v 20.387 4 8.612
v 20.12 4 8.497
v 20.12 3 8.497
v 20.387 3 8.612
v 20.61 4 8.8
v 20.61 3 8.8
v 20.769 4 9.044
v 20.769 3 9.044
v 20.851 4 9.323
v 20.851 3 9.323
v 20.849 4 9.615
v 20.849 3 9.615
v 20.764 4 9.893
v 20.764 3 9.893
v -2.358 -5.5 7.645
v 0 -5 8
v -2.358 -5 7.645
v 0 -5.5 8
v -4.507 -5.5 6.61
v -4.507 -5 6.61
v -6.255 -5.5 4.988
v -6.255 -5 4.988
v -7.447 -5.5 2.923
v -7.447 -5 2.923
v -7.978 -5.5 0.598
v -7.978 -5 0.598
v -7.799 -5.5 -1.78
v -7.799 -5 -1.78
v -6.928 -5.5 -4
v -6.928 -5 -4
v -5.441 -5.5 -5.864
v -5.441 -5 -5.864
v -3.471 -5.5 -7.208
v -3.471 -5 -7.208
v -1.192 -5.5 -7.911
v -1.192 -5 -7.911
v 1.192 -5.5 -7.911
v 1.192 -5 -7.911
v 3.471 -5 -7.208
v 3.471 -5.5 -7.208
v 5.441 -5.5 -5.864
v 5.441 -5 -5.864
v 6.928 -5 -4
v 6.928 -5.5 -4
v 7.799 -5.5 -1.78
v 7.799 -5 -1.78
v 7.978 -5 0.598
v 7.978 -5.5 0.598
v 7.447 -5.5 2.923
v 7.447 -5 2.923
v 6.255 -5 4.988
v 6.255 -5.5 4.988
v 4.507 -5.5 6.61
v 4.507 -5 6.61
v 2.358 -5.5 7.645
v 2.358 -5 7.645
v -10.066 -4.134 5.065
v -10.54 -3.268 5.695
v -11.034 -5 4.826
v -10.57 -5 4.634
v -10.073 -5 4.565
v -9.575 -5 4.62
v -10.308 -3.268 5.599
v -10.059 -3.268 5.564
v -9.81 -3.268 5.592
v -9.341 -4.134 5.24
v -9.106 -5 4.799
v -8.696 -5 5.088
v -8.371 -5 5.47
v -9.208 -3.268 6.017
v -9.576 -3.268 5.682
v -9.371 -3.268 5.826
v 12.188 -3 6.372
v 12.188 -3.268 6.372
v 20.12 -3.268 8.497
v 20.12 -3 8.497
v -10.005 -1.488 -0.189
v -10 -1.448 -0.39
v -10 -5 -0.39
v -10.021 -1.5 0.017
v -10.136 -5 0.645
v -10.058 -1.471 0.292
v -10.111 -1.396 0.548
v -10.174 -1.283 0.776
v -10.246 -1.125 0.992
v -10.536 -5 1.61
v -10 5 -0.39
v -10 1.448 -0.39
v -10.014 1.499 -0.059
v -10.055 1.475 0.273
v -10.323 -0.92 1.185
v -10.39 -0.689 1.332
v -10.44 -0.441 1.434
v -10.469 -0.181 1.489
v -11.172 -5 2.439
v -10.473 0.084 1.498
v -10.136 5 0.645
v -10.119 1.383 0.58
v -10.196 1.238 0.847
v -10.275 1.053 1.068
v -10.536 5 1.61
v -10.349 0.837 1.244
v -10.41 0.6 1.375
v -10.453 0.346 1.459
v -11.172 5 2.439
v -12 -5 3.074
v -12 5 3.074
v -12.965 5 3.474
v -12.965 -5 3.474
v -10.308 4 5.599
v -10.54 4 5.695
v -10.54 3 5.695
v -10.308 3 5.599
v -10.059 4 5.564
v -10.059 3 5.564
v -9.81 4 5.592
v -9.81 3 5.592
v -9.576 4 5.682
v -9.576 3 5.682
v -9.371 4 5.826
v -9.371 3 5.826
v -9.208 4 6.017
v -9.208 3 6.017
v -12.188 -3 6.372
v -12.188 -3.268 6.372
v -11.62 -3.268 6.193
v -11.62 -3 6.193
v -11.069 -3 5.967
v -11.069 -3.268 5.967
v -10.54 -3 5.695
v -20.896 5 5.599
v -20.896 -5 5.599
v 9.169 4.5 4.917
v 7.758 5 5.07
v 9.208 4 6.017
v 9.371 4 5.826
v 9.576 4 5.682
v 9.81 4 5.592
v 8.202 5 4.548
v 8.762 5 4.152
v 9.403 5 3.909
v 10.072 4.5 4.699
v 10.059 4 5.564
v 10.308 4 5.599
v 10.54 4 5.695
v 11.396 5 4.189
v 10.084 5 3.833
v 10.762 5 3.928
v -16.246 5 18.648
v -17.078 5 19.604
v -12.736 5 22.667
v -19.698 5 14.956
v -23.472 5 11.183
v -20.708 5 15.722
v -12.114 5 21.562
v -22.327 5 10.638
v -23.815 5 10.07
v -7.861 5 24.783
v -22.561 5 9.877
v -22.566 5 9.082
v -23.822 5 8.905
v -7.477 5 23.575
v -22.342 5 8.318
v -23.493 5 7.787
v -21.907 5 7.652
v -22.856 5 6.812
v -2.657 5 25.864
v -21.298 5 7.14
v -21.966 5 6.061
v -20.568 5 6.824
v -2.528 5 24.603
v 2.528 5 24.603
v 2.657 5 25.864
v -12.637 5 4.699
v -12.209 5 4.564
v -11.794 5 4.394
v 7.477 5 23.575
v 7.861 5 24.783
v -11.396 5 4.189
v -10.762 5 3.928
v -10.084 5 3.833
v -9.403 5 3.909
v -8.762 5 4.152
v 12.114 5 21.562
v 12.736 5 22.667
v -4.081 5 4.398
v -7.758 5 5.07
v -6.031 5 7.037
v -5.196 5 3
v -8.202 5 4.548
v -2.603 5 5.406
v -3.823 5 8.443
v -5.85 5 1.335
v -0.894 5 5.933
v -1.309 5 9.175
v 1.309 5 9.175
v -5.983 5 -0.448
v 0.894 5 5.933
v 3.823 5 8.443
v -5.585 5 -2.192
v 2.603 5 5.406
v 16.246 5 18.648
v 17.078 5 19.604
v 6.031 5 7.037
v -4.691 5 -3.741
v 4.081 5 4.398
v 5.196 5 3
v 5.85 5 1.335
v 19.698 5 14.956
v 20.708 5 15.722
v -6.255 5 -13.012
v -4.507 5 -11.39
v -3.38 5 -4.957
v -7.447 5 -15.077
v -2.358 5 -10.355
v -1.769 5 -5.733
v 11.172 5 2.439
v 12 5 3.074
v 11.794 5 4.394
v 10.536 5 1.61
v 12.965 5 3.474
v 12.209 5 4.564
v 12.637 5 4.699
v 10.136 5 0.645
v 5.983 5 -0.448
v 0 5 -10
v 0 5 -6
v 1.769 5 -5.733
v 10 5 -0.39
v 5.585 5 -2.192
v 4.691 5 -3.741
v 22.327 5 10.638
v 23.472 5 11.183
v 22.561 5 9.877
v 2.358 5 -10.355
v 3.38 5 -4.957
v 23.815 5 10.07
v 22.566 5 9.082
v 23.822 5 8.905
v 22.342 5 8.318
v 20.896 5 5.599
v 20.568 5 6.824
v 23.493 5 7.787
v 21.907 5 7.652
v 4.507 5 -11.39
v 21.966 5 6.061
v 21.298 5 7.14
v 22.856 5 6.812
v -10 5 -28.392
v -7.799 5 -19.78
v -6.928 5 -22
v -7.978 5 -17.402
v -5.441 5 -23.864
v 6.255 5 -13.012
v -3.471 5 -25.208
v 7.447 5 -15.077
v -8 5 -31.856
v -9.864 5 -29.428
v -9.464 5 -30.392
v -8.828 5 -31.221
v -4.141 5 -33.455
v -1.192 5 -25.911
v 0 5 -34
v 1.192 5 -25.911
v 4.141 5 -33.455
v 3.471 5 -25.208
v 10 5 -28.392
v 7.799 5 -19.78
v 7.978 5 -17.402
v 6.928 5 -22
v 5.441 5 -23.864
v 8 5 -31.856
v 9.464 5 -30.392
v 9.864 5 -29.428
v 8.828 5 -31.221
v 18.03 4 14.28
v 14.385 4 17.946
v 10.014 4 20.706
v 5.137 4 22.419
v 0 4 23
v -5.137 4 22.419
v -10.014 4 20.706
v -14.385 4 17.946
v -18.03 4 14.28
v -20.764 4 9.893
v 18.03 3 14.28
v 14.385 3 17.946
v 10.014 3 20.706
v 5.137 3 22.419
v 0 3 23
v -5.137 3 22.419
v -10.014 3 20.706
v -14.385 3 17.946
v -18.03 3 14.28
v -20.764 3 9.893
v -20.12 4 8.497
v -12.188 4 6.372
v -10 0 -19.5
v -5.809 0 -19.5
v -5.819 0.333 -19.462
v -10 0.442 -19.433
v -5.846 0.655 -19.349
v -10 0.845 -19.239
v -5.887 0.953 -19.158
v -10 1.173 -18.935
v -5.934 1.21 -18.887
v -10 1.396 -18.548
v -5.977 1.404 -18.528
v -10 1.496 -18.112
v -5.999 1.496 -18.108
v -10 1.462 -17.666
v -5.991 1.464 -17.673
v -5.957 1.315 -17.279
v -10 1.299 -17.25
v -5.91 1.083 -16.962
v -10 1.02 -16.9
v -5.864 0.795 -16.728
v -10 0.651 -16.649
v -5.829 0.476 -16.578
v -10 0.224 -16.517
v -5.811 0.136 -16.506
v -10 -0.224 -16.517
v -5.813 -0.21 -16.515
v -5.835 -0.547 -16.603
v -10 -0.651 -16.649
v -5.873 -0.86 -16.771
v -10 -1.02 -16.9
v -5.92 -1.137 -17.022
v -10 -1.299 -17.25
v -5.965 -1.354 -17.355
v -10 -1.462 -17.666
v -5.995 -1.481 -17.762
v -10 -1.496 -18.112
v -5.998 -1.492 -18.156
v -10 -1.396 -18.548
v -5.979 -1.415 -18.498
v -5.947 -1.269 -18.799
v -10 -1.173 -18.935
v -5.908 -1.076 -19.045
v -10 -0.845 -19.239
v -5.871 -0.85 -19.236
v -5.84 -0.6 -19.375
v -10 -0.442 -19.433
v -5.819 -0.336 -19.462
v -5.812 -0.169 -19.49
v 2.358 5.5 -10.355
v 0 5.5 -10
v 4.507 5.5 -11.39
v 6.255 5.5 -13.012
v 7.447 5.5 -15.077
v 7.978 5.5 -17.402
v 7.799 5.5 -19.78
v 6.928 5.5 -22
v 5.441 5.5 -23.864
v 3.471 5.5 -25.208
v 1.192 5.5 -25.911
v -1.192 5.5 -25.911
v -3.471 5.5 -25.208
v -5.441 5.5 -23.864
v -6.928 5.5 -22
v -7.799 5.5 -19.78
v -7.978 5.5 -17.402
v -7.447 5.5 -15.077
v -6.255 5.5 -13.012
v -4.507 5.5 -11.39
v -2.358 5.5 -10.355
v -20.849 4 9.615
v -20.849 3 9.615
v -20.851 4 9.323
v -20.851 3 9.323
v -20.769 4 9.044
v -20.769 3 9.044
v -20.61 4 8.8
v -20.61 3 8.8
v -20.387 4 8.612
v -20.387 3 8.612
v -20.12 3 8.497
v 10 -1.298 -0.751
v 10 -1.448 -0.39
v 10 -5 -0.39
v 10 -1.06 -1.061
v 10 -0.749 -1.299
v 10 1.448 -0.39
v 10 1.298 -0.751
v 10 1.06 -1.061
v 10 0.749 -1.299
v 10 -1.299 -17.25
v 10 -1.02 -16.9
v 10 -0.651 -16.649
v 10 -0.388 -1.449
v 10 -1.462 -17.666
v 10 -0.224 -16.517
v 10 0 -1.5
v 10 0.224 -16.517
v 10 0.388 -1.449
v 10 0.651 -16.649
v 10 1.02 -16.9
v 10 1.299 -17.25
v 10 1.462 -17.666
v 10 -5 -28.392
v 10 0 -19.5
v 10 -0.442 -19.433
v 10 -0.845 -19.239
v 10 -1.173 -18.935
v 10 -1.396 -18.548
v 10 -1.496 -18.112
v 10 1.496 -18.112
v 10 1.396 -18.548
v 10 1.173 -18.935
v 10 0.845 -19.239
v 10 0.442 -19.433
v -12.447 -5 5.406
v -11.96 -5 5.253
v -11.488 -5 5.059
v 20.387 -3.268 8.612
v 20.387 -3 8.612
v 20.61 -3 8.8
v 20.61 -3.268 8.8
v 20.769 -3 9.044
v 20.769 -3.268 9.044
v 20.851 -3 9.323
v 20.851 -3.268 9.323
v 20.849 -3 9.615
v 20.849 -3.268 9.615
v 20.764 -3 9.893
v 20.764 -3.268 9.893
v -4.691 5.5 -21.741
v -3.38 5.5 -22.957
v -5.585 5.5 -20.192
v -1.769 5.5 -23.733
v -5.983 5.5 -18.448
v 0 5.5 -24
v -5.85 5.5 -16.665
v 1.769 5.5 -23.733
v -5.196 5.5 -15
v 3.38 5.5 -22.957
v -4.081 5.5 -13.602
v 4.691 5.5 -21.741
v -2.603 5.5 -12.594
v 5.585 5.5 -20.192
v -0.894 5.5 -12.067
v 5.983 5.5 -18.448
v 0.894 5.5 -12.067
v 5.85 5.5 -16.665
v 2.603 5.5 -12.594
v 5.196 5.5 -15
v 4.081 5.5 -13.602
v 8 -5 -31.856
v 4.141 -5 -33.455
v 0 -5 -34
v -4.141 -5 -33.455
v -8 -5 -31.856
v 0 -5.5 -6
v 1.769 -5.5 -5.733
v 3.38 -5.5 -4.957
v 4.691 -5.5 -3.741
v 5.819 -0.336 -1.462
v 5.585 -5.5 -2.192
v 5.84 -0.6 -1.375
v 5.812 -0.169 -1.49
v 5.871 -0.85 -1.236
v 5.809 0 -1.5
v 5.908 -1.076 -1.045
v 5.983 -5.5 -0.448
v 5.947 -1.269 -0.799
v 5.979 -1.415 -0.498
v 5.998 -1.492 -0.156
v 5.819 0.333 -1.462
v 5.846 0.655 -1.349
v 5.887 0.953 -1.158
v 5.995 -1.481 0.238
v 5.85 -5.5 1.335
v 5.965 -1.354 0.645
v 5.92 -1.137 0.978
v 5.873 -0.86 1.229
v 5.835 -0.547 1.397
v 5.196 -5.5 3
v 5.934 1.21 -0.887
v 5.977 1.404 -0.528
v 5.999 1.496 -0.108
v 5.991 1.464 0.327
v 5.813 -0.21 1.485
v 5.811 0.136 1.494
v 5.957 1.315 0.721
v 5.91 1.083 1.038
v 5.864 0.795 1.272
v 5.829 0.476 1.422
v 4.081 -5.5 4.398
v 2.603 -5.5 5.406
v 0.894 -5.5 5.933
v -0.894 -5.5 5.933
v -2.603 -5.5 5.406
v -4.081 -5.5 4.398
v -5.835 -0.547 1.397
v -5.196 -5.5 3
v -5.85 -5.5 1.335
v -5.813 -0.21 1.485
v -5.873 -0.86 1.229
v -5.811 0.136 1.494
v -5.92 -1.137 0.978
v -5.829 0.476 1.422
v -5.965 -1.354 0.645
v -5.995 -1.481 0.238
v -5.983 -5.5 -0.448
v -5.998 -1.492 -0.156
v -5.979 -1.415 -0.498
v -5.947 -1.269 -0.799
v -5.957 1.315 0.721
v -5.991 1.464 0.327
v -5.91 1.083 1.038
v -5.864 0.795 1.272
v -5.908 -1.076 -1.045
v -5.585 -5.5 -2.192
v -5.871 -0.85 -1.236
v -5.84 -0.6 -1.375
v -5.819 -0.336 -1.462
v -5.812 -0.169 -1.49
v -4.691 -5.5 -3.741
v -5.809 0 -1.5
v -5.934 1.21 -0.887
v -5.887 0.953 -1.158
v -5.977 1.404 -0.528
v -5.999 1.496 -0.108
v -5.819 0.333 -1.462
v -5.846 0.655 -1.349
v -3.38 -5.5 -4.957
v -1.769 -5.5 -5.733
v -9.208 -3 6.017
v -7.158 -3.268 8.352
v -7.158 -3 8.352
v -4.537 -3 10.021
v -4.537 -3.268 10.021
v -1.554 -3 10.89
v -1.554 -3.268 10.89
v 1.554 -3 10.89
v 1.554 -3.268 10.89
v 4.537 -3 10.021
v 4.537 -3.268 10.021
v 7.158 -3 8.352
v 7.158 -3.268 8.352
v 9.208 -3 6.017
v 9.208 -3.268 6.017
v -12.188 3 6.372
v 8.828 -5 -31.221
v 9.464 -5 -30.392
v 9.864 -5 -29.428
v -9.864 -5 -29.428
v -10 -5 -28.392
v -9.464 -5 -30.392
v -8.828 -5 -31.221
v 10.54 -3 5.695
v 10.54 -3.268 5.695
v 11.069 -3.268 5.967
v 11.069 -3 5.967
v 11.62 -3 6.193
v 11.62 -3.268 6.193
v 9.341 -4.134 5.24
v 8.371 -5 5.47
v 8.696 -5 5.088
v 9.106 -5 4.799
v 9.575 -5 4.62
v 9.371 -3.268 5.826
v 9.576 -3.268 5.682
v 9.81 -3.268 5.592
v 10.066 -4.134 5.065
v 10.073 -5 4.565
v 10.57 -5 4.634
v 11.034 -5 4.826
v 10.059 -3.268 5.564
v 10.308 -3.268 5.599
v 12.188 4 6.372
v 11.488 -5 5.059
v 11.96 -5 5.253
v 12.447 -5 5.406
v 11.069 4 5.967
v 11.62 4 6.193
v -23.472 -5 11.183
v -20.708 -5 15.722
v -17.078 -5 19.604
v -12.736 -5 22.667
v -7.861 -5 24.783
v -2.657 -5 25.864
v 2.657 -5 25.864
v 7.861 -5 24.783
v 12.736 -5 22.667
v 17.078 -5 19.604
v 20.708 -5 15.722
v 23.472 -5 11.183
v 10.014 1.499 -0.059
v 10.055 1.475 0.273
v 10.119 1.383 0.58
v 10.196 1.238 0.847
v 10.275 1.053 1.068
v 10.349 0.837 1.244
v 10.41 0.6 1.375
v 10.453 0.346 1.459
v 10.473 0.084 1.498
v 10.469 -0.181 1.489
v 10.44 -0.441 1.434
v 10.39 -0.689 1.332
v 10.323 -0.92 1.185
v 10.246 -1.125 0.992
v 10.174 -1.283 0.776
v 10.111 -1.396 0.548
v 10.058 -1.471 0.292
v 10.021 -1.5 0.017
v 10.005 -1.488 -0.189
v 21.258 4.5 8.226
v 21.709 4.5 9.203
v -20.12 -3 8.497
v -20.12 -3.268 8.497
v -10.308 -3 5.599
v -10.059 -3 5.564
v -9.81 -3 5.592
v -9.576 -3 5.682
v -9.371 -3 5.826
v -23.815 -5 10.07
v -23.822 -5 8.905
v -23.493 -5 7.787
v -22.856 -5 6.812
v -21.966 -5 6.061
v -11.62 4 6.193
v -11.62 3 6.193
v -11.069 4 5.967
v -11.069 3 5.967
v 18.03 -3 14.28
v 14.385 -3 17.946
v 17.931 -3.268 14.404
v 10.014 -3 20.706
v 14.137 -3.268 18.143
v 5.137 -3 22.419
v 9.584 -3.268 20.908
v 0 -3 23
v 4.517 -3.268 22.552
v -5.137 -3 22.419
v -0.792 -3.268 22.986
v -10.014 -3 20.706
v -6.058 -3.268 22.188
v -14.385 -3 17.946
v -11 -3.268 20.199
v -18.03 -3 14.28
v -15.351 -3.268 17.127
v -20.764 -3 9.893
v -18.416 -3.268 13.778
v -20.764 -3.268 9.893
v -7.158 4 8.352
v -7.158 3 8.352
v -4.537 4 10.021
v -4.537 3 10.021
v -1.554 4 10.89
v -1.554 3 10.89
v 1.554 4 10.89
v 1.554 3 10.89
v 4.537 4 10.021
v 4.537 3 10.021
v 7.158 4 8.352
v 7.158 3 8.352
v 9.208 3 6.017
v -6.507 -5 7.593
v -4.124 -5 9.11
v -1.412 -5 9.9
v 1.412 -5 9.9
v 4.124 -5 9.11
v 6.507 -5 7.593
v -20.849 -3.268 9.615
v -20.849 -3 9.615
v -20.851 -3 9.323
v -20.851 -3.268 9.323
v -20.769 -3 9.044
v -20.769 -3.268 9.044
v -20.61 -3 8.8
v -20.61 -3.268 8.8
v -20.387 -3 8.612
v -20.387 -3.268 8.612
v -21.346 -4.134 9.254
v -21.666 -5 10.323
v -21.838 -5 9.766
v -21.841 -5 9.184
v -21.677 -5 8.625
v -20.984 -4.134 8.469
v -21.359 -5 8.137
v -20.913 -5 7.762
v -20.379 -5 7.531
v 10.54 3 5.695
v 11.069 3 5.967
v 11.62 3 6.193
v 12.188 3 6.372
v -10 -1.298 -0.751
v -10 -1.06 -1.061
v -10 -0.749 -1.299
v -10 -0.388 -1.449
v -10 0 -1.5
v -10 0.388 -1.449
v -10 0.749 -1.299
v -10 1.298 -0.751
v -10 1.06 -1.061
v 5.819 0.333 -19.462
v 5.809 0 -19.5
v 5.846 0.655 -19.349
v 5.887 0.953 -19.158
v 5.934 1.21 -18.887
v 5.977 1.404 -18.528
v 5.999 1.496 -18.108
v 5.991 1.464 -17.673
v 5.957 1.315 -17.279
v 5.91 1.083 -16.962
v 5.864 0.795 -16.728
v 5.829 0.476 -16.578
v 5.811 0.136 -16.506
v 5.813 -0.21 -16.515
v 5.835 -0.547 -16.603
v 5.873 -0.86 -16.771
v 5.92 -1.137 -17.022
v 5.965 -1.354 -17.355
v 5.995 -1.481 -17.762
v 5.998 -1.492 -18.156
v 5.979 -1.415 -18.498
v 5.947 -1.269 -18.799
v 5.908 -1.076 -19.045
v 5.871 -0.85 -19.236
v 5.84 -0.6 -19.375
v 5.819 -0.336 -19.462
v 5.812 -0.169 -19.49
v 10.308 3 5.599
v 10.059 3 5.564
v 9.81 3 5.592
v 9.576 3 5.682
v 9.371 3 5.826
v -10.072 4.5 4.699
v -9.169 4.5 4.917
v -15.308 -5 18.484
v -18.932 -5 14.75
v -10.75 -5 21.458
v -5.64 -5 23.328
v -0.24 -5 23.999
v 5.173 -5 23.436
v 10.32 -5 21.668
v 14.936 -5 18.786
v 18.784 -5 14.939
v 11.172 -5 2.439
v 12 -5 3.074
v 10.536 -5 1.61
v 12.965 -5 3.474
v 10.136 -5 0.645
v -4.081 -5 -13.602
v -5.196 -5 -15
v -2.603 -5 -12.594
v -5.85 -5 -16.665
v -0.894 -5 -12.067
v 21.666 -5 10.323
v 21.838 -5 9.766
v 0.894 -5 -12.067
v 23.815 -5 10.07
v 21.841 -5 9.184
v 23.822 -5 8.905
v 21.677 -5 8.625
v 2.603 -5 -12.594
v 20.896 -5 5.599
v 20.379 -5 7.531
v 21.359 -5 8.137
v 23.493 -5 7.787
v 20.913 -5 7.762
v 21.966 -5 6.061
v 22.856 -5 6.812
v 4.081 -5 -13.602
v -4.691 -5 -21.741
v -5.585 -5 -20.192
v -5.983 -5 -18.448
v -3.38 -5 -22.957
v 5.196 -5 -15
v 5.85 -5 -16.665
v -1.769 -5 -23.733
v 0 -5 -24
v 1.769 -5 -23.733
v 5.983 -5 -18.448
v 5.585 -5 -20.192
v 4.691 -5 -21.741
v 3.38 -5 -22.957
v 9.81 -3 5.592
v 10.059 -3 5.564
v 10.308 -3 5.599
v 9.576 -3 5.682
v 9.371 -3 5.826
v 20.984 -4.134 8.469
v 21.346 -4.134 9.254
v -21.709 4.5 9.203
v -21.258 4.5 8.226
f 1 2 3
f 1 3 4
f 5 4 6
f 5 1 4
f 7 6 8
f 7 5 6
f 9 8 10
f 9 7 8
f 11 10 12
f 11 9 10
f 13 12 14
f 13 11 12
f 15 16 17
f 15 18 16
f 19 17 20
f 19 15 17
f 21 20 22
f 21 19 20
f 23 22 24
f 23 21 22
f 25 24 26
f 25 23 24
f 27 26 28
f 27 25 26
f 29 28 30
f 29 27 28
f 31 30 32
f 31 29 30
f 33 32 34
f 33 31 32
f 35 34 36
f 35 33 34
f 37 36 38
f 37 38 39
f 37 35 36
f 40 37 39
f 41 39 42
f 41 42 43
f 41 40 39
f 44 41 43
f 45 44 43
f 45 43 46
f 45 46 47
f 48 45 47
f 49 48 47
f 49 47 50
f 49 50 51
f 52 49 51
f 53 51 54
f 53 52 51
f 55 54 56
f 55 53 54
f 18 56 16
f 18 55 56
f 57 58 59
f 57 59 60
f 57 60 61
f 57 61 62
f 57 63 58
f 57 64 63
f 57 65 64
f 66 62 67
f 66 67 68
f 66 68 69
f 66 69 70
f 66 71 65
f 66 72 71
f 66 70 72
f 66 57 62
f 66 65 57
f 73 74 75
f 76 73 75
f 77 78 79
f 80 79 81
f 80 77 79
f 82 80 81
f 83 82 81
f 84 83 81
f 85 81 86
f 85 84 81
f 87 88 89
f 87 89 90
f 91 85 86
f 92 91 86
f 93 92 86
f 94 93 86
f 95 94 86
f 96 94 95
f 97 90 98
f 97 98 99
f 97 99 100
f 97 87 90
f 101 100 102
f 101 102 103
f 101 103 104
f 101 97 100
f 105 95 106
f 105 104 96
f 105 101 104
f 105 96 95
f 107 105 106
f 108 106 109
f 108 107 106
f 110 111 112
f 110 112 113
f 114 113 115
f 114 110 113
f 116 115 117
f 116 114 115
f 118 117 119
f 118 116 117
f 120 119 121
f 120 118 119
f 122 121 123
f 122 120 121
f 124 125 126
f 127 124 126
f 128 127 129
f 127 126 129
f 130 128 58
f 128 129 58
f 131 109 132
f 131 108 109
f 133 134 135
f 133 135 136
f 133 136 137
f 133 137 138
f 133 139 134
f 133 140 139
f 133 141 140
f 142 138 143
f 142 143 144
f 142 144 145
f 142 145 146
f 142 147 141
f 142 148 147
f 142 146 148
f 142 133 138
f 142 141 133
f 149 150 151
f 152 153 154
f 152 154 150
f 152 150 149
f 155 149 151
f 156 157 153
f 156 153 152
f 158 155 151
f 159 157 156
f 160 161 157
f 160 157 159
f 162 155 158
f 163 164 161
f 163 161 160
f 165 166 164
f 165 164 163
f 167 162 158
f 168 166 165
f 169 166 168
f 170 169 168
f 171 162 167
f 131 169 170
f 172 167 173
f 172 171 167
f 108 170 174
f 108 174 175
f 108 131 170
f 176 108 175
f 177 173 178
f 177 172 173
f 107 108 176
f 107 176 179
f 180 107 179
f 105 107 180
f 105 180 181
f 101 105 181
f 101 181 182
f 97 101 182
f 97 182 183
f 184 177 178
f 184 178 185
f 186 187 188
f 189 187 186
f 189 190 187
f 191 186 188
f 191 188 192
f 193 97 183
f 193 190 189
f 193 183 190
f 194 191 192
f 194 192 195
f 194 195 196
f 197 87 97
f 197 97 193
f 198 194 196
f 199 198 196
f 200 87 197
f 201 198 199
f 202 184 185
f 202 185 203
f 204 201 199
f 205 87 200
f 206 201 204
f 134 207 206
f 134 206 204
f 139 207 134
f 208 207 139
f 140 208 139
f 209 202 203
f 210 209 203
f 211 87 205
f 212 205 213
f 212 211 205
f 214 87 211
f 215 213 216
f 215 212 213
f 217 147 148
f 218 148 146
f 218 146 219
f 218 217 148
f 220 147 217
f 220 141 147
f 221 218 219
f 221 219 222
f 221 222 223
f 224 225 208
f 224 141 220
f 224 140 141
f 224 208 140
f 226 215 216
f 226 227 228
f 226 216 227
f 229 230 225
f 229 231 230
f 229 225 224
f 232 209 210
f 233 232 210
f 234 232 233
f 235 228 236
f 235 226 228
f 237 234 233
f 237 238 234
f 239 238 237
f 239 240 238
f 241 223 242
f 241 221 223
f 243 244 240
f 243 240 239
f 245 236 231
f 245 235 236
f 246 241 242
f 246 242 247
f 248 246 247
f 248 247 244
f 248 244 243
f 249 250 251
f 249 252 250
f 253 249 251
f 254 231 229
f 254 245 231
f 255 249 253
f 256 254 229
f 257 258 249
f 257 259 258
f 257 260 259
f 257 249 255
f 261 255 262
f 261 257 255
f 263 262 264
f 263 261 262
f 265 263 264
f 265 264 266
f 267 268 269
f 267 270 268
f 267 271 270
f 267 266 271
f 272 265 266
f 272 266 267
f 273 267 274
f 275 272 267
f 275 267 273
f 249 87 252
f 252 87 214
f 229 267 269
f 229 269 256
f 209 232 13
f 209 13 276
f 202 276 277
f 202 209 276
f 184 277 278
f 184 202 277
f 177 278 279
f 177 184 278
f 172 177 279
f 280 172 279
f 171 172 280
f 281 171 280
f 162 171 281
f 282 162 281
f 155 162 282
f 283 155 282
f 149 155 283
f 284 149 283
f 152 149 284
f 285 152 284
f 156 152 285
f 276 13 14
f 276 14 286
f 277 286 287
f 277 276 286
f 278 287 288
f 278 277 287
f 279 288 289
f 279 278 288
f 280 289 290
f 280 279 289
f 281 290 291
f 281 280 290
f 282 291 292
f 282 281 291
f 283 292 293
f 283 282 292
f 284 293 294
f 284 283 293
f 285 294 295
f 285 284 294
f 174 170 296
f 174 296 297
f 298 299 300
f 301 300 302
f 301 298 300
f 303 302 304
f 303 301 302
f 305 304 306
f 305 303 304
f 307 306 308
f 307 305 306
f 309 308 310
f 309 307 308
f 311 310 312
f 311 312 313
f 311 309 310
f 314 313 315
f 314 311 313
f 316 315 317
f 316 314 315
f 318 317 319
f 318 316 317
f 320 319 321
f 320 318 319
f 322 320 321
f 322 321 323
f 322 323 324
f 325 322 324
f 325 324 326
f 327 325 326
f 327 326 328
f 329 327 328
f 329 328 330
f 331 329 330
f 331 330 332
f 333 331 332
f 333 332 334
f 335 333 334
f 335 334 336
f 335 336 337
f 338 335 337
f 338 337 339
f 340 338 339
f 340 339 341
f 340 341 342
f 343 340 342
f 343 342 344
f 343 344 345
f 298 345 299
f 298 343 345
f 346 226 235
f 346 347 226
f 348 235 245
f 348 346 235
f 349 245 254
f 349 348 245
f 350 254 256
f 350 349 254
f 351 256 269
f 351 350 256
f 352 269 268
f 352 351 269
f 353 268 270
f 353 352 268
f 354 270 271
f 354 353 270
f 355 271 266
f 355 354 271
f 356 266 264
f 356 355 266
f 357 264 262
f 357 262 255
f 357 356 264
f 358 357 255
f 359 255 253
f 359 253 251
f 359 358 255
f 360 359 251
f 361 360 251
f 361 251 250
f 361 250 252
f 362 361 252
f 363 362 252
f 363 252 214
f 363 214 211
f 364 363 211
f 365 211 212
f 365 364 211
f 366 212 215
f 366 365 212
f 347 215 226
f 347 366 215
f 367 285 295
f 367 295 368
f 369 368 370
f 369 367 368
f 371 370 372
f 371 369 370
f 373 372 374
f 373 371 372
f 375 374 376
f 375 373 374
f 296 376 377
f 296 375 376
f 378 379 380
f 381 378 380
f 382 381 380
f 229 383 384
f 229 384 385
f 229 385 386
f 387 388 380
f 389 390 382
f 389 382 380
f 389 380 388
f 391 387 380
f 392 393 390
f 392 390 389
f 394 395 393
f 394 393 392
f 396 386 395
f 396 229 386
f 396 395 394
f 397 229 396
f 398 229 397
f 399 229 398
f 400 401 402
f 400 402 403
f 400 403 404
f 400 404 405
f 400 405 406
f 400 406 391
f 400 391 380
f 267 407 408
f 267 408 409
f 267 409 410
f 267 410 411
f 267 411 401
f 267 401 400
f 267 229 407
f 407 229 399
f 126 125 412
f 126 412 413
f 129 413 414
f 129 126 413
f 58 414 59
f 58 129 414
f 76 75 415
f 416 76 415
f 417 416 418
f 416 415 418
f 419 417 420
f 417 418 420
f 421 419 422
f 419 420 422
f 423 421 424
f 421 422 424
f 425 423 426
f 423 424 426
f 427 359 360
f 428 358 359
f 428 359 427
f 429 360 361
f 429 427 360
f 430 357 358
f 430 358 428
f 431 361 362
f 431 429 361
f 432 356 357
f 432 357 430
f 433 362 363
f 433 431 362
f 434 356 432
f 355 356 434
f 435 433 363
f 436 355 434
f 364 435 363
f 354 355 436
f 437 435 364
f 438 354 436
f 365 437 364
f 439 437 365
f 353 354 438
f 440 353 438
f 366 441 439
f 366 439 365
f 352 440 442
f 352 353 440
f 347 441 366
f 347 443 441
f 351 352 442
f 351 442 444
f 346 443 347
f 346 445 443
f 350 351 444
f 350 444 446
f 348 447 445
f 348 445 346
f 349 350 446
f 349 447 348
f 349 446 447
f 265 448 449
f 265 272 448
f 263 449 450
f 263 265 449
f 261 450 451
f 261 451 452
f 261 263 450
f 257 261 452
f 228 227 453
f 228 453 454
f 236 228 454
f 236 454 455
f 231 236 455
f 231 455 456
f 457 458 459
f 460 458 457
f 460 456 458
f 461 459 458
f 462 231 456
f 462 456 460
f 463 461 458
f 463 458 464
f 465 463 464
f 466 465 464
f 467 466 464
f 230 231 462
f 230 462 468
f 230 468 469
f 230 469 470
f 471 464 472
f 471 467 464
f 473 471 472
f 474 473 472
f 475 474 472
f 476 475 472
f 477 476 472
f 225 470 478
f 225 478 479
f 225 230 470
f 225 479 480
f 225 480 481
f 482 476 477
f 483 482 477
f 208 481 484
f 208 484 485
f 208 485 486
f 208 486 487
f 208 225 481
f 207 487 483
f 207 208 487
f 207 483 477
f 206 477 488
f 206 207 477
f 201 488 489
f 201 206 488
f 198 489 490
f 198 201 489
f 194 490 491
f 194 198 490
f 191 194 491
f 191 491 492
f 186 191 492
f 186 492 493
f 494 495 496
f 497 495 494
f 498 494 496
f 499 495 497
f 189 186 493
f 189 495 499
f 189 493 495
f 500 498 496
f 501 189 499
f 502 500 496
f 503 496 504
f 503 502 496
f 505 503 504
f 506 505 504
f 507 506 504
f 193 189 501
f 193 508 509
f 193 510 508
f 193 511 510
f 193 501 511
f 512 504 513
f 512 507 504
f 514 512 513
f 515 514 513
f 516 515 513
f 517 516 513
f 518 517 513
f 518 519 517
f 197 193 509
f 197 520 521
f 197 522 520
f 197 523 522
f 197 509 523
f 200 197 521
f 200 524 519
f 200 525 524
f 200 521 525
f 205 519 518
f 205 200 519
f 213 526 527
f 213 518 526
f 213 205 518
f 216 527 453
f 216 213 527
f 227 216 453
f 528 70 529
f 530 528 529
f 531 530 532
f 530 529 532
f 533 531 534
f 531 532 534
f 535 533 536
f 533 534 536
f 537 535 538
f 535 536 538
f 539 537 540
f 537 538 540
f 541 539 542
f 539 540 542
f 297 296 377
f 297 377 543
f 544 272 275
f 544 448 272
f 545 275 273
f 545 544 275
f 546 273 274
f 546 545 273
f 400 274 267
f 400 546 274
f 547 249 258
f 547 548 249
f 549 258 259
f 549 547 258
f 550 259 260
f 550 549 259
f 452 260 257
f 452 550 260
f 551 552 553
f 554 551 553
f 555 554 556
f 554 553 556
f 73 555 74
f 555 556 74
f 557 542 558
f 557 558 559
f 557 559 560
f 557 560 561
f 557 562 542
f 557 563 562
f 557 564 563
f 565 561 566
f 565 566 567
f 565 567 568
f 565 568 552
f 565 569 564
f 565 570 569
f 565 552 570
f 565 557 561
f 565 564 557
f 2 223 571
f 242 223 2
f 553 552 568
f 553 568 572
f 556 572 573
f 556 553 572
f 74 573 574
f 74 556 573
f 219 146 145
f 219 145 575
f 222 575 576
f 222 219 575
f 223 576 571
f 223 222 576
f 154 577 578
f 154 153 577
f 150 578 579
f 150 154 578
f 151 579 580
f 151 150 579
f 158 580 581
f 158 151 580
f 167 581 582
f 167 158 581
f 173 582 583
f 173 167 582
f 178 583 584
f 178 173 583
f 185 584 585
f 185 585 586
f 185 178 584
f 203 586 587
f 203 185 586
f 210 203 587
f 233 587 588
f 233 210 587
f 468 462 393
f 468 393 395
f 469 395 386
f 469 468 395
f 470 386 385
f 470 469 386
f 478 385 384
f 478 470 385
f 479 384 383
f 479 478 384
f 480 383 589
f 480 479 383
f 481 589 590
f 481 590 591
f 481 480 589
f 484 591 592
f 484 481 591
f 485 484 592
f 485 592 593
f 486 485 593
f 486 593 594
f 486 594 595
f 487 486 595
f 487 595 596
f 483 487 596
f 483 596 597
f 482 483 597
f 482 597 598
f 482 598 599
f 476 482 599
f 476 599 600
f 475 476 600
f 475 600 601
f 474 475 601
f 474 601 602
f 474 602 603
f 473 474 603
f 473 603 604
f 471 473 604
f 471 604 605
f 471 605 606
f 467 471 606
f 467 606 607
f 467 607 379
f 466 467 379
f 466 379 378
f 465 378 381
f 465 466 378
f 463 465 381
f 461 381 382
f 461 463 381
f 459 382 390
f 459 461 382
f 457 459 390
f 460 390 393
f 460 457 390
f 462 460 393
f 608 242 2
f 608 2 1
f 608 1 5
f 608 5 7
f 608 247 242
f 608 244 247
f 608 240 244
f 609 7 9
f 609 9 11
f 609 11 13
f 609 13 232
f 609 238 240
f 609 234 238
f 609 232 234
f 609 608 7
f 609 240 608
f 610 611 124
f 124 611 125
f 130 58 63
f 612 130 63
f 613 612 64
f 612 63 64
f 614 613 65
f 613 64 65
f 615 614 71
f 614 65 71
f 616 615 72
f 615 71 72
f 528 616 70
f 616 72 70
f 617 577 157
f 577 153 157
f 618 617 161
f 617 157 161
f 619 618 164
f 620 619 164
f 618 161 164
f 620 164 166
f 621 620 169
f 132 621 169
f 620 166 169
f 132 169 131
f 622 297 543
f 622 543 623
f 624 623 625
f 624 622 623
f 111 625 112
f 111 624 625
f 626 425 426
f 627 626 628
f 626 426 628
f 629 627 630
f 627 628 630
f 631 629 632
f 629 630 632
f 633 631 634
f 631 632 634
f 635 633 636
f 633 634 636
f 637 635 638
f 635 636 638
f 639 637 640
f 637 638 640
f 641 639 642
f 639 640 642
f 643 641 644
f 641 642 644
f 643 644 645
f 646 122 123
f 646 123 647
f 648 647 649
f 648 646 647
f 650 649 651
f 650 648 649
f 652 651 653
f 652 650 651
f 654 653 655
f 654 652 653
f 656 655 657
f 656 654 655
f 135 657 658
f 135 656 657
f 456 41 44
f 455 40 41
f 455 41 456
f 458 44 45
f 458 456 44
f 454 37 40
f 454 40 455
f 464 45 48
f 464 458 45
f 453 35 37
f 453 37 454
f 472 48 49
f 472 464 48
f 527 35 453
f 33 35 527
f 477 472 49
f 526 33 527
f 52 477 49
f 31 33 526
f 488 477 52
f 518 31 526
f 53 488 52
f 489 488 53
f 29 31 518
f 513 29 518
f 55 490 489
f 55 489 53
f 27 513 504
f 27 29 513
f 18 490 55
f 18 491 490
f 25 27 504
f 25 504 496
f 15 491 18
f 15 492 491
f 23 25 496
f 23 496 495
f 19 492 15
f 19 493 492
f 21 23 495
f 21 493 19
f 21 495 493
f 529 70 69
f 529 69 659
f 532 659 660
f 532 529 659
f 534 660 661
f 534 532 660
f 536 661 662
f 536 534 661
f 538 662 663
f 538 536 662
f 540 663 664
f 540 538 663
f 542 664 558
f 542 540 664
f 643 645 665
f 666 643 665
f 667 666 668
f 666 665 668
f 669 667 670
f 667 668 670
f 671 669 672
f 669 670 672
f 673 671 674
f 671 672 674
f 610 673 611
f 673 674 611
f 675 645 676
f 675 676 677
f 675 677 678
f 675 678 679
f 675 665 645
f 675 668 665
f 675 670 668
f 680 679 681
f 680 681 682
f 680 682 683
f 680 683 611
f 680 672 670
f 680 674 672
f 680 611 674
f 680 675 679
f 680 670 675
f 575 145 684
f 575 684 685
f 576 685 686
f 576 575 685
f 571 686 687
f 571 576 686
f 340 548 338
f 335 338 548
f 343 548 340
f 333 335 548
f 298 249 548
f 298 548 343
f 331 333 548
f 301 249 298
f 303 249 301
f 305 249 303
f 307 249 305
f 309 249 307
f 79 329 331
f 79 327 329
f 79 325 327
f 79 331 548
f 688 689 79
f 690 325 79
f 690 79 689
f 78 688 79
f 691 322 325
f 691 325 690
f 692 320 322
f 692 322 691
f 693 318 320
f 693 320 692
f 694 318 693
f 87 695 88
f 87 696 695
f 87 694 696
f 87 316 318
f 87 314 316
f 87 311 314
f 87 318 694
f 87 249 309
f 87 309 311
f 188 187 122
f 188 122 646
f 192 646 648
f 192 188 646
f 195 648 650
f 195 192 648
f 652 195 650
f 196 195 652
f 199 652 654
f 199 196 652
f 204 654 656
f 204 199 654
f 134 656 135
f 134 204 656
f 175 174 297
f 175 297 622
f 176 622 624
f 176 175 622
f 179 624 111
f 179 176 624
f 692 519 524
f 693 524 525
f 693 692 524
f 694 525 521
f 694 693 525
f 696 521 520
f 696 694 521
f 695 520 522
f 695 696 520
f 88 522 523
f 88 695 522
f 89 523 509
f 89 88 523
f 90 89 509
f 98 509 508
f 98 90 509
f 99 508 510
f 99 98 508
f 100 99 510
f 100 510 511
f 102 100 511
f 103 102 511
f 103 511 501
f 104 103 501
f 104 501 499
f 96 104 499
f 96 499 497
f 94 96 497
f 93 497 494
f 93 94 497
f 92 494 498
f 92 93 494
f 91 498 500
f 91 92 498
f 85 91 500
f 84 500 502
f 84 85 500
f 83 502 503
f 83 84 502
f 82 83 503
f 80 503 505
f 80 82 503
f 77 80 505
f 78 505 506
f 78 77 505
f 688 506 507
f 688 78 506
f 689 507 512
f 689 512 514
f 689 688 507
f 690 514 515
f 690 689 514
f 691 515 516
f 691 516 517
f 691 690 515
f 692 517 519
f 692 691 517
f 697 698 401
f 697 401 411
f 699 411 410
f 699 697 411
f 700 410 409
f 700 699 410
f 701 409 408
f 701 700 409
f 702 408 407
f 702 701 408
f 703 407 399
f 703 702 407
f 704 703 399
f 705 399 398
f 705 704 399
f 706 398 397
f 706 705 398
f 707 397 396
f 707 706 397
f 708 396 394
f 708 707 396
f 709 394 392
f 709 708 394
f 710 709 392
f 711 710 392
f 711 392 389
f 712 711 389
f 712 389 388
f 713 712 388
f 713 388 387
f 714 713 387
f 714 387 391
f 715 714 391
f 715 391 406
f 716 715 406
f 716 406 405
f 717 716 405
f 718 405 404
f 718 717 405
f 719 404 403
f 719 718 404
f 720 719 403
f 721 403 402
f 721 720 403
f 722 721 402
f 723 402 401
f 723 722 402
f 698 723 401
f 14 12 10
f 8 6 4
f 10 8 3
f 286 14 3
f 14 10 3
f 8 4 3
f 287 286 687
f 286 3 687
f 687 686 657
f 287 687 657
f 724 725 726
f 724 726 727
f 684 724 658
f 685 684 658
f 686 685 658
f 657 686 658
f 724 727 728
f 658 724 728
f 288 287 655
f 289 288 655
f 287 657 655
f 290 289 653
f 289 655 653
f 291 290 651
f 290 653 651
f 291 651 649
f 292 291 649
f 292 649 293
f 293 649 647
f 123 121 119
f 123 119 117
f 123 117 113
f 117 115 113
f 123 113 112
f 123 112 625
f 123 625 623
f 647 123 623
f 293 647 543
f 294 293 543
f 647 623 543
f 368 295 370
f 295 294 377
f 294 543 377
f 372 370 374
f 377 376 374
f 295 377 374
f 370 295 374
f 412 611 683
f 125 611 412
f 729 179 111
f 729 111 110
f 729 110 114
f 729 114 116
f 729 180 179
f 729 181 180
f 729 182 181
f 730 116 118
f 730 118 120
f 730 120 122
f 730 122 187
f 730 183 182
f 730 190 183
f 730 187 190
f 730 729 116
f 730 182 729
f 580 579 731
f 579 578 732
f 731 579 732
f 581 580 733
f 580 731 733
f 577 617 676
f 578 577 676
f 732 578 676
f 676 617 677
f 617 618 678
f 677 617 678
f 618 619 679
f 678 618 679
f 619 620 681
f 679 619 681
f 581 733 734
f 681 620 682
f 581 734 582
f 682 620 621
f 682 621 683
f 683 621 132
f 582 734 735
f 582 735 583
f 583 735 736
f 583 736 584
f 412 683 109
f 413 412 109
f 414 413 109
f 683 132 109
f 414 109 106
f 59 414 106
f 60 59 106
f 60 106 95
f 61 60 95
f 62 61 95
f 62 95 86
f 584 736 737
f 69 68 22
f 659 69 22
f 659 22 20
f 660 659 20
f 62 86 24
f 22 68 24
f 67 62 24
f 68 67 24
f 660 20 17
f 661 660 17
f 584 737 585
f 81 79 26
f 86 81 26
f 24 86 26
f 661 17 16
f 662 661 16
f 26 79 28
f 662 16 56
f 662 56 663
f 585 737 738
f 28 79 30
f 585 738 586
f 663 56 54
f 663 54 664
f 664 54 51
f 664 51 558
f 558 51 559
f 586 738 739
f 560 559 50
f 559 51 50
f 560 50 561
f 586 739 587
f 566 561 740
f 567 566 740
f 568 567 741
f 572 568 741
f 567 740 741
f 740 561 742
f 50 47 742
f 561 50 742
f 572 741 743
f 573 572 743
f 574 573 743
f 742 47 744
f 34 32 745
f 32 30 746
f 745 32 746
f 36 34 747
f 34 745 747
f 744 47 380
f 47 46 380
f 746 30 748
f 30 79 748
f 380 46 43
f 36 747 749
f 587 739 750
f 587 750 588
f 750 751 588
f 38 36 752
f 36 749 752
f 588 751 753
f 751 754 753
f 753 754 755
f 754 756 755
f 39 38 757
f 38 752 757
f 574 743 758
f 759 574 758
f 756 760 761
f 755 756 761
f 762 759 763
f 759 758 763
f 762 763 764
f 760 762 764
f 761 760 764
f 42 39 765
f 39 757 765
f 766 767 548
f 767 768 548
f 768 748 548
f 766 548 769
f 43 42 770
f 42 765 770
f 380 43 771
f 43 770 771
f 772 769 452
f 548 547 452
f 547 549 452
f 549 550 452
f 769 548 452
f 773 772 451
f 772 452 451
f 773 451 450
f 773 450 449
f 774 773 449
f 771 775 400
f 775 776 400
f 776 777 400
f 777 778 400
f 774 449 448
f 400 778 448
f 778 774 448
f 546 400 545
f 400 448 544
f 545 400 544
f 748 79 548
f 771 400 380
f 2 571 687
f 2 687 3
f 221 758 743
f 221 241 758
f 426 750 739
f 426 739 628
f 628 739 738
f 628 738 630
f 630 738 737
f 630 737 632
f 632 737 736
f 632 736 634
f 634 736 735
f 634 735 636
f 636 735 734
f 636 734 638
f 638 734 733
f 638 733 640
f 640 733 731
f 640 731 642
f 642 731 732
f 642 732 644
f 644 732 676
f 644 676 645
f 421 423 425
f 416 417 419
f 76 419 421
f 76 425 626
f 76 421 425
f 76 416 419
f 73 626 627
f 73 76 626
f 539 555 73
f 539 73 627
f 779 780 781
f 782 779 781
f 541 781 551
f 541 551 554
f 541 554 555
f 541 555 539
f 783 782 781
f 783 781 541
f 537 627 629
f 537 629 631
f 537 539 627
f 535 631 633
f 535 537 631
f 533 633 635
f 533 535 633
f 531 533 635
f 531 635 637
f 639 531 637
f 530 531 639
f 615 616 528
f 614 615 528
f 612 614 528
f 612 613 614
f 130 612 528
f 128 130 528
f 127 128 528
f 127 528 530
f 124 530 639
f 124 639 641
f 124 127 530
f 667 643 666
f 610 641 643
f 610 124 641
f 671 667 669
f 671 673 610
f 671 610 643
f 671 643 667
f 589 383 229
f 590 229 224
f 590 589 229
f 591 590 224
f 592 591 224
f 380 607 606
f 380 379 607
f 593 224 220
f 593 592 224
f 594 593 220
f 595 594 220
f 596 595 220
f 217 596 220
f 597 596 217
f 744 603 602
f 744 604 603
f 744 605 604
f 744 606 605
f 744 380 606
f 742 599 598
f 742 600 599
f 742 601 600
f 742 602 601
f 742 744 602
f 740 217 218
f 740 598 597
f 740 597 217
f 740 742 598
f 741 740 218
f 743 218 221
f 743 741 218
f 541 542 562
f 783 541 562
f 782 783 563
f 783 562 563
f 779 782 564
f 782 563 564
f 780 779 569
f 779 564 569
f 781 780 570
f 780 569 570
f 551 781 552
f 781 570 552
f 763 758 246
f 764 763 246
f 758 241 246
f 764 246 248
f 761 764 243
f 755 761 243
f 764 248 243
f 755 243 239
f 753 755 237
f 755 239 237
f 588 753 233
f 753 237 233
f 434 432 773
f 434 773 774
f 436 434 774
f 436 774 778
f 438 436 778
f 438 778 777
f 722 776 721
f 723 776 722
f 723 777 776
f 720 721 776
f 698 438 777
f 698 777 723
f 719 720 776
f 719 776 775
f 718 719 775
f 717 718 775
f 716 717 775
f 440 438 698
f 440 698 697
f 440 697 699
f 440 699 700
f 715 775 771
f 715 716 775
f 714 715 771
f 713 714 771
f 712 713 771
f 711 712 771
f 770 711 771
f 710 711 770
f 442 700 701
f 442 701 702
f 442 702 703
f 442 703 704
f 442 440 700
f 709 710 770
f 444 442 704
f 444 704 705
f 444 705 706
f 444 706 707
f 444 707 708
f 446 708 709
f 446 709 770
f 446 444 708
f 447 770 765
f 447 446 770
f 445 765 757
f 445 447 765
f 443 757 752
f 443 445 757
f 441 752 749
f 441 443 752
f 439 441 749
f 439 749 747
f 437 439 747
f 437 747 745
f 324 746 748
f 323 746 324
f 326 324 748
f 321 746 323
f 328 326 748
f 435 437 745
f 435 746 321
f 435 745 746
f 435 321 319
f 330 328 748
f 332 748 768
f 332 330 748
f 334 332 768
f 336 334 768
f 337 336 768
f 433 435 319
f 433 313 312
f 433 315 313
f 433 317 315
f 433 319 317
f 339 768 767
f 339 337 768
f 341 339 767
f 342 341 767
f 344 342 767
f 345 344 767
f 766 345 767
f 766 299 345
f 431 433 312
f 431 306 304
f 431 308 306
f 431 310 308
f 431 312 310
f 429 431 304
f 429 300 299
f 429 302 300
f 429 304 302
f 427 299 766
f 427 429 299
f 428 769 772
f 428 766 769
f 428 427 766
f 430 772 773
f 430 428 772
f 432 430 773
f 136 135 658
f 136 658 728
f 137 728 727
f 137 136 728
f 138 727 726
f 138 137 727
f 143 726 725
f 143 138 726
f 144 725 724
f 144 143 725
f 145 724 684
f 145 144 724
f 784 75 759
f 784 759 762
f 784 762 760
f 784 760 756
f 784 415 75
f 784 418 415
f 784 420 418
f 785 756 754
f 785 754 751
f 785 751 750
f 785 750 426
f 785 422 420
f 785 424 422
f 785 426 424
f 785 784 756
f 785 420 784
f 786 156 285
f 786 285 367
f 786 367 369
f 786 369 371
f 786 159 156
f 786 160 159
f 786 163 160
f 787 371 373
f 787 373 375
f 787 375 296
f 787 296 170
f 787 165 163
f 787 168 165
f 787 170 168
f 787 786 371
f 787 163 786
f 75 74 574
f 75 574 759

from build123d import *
from OCP.BRepFilletAPI import BRepFilletAPI_MakeChamfer

# Parameters (mm, degrees)
BOSS_EXTRUDE1_DEPTH     = 5
FILLET1_R               = 4
SKETCH2_R               = 8
BOSS_EXTRUDE2_DEPTH     = 0.5
SKETCH3_R               = 8
BOSS_EXTRUDE3_DEPTH     = 0.5
SKETCH4_R               = 8
BOSS_EXTRUDE4_DEPTH     = 0.5
CUT_EXTRUDE1_DEPTH      = 43.969085178
CUT_EXTRUDE1_DEPTH_BACK = 43.969085178
SKETCH5_R               = 6
CUT_EXTRUDE2_DEPTH      = 2
CHAMFER2_SIZE           = 1
CHAMFER2_SIZE2          = 1.732050808
CUT_EXTRUDE4_DEPTH      = 42.899788694
CUT_EXTRUDE4_DEPTH_BACK = 42.899788694
SKETCH9_R               = 1.5


with BuildPart() as part:
    # Sketch1 → Boss-Extrude1 (new, symmetric)
    with BuildSketch(Plane(origin=(0, 0, 0), x_dir=(1, 0, 0), z_dir=(0, 1, 0))):
        with BuildLine():
            Line((-10, 30.489995997), (-10, -2.679491924))
            Line((-10, -2.679491924), (-25.114071484, -6.729295173))
            ThreePointArc((-25.114071484, -6.729295173), (0, -26), (25.114071484, -6.729295173))
            Line((25.114071484, -6.729295173), (10, -2.679491924))
            Line((10, -2.679491924), (10, 30.489995997))
            ThreePointArc((10, 30.489995997), (0, 34), (-10, 30.489995997))
        make_face()
    extrude(amount=BOSS_EXTRUDE1_DEPTH, both=True)

    # Fillet1
    fillet1_edges = [part.edges().sort_by_distance(p)[0] for p in [
        (10, 0, -30.489995997),
        (10, 0, 2.679491924),
        (25.114071484, 0, 6.729295173),
        (-25.114071484, 0, 6.729295173),
        (-10, 0, 2.679491924),
        (-10, 0, -30.489995997),
    ]]
    fillet(fillet1_edges, radius=FILLET1_R)

    # Sketch2 → Boss-Extrude2 (add, symmetric)
    with BuildSketch(Plane(origin=(0, 0, 0), x_dir=(1, 0, 0), z_dir=(0, 1, 0))):
        with Locations((0, 18)):
            Circle(SKETCH2_R)
    extrude(amount=BOSS_EXTRUDE2_DEPTH, both=True)

    # Sketch3 → Boss-Extrude3 (add, symmetric)
    with BuildSketch(Plane(origin=(0, 5, 0), x_dir=(1, 0, 0), z_dir=(0, 1, 0))):
        with Locations(Location((0, 18, 0), (0, 0, 270))):
            Circle(SKETCH3_R)
    extrude(amount=BOSS_EXTRUDE3_DEPTH, both=True)

    # Sketch4 → Boss-Extrude4 (add, symmetric)
    with BuildSketch(Plane.XZ.offset(5)):
        with Locations(Location((0, 0, 0), (0, 0, 90))):
            Circle(SKETCH4_R)
    extrude(amount=BOSS_EXTRUDE4_DEPTH, both=True)

    # Sketch5 → Cut-Extrude1 (cut, two sides: drawn at the far end of the back side and taken through both)
    with BuildSketch(Plane(origin=(0, -5.5, 0), x_dir=(-1, 0, 0), z_dir=(0, -1, 0)).offset(-CUT_EXTRUDE1_DEPTH_BACK)):
        with Locations(Location((0, 0, 0), (0, 0, 90))):
            Circle(SKETCH5_R)
        with Locations(Location((0, 18, 0), (0, 0, 90))):
            Circle(SKETCH5_R)
    extrude(amount=CUT_EXTRUDE1_DEPTH + CUT_EXTRUDE1_DEPTH_BACK, mode=Mode.SUBTRACT)

    # Sketch6 → Cut-Extrude2 (cut)
    with BuildSketch(Plane(origin=(0, 5, 0), x_dir=(1, 0, 0), z_dir=(0, 1, 0))):
        with BuildLine():
            Line((12.188266684, -6.371664756), (20.119713435, -8.496889508))
            ThreePointArc((20.119713435, -8.496889508), (20.768948696, -9.043962883), (20.763662316, -9.892943304))
            ThreePointArc((20.763662316, -9.892943304), (0, -23), (-20.763662316, -9.892943304))
            ThreePointArc((-20.763662316, -9.892943304), (-20.768948696, -9.043962883), (-20.119713435, -8.496889508))
            Line((-20.119713435, -8.496889508), (-12.188266684, -6.371664756))
            ThreePointArc((-12.188266684, -6.371664756), (-11.342355786, -6.086056673), (-10.539679728, -5.695098402))
            ThreePointArc((-10.539679728, -5.695098402), (-9.810114884, -5.592432974), (-9.208235905, -6.017340901))
            ThreePointArc((-9.208235905, -6.017340901), (0, -11), (9.208235905, -6.017340901))
            ThreePointArc((9.208235905, -6.017340901), (9.810114884, -5.592432974), (10.539679728, -5.695098402))
            ThreePointArc((10.539679728, -5.695098402), (11.342355786, -6.086056673), (12.188266684, -6.371664756))
        make_face()
    cut_extrude2 = extrude(amount=-CUT_EXTRUDE2_DEPTH, mode=Mode.SUBTRACT)

    # Mirror7: Cut-Extrude2 across plane
    add(cut_extrude2.mirror(Plane.ZX), mode=Mode.SUBTRACT)

    # Chamfer2: one chamfer whose edges measure the first distance from different faces: ONE call of the kernel's chamfer builder (chamfer() names one face for all edges)
    chamfer2_edges_1 = [part.edges().sort_by_distance(p)[0] for p in [
        (9.810114884, -5, 5.592432974),
        (0, -5, 11),
        (-9.810114884, -5, 5.592432974),
        (-11.342355786, -5, 6.086056673),
        (-16.153990059, -5, 7.434277132),
        (-20.768948696, -5, 9.043962883),
        (0, -5, 23),
        (20.768948696, -5, 9.043962883),
        (16.153990059, -5, 7.434277132),
        (11.342355786, -5, 6.086056673),
    ]]
    chamfer2_side_1 = [part.faces().sort_by_distance(p)[0] for p in [
        (-9.233359985, -5, -14.391060437),
    ]]
    chamfer2_edges_2 = [part.edges().sort_by_distance(p)[0] for p in [
        (9.810114884, 5, 5.592432974),
    ]]
    chamfer2_side_2 = [part.faces().sort_by_distance(p)[0] for p in [
        (9.810114884, 4, 5.592432974),
    ]]
    chamfer2_edges_3 = [part.edges().sort_by_distance(p)[0] for p in [
        (0, 5, 11),
    ]]
    chamfer2_side_3 = [part.faces().sort_by_distance(p)[0] for p in [
        (0, 4, 11),
    ]]
    chamfer2_edges_4 = [part.edges().sort_by_distance(p)[0] for p in [
        (-9.810114884, 5, 5.592432974),
    ]]
    chamfer2_side_4 = [part.faces().sort_by_distance(p)[0] for p in [
        (-9.810114884, 4, 5.592432974),
    ]]
    chamfer2_edges_5 = [part.edges().sort_by_distance(p)[0] for p in [
        (-11.342355786, 5, 6.086056673),
    ]]
    chamfer2_side_5 = [part.faces().sort_by_distance(p)[0] for p in [
        (-11.342355786, 4, 6.086056673),
    ]]
    chamfer2_edges_6 = [part.edges().sort_by_distance(p)[0] for p in [
        (-16.153990059, 5, 7.434277132),
    ]]
    chamfer2_side_6 = [part.faces().sort_by_distance(p)[0] for p in [
        (-16.153990059, 4, 7.434277132),
    ]]
    chamfer2_edges_7 = [part.edges().sort_by_distance(p)[0] for p in [
        (-20.768948696, 5, 9.043962883),
    ]]
    chamfer2_side_7 = [part.faces().sort_by_distance(p)[0] for p in [
        (-20.768948696, 4, 9.043962883),
    ]]
    chamfer2_edges_8 = [part.edges().sort_by_distance(p)[0] for p in [
        (0, 5, 23),
    ]]
    chamfer2_side_8 = [part.faces().sort_by_distance(p)[0] for p in [
        (0, 4, 23),
    ]]
    chamfer2_edges_9 = [part.edges().sort_by_distance(p)[0] for p in [
        (20.768948696, 5, 9.043962883),
    ]]
    chamfer2_side_9 = [part.faces().sort_by_distance(p)[0] for p in [
        (20.768948696, 4, 9.043962883),
    ]]
    chamfer2_edges_10 = [part.edges().sort_by_distance(p)[0] for p in [
        (16.153990059, 5, 7.434277132),
    ]]
    chamfer2_side_10 = [part.faces().sort_by_distance(p)[0] for p in [
        (16.153990059, 4, 7.434277132),
    ]]
    chamfer2_edges_11 = [part.edges().sort_by_distance(p)[0] for p in [
        (11.342355786, 5, 6.086056673),
    ]]
    chamfer2_side_11 = [part.faces().sort_by_distance(p)[0] for p in [
        (11.342355786, 4, 6.086056673),
    ]]
    chamfer2 = BRepFilletAPI_MakeChamfer(part.part.solid().wrapped)
    for e in chamfer2_edges_1:
        chamfer2.Add(CHAMFER2_SIZE, CHAMFER2_SIZE2, e.wrapped, chamfer2_side_1[0].wrapped)  # the first distance lies on this face
    for e in chamfer2_edges_2:
        chamfer2.Add(CHAMFER2_SIZE, CHAMFER2_SIZE2, e.wrapped, chamfer2_side_2[0].wrapped)  # the first distance lies on this face
    for e in chamfer2_edges_3:
        chamfer2.Add(CHAMFER2_SIZE, CHAMFER2_SIZE2, e.wrapped, chamfer2_side_3[0].wrapped)  # the first distance lies on this face
    for e in chamfer2_edges_4:
        chamfer2.Add(CHAMFER2_SIZE, CHAMFER2_SIZE2, e.wrapped, chamfer2_side_4[0].wrapped)  # the first distance lies on this face
    for e in chamfer2_edges_5:
        chamfer2.Add(CHAMFER2_SIZE, CHAMFER2_SIZE2, e.wrapped, chamfer2_side_5[0].wrapped)  # the first distance lies on this face
    for e in chamfer2_edges_6:
        chamfer2.Add(CHAMFER2_SIZE, CHAMFER2_SIZE2, e.wrapped, chamfer2_side_6[0].wrapped)  # the first distance lies on this face
    for e in chamfer2_edges_7:
        chamfer2.Add(CHAMFER2_SIZE, CHAMFER2_SIZE2, e.wrapped, chamfer2_side_7[0].wrapped)  # the first distance lies on this face
    for e in chamfer2_edges_8:
        chamfer2.Add(CHAMFER2_SIZE, CHAMFER2_SIZE2, e.wrapped, chamfer2_side_8[0].wrapped)  # the first distance lies on this face
    for e in chamfer2_edges_9:
        chamfer2.Add(CHAMFER2_SIZE, CHAMFER2_SIZE2, e.wrapped, chamfer2_side_9[0].wrapped)  # the first distance lies on this face
    for e in chamfer2_edges_10:
        chamfer2.Add(CHAMFER2_SIZE, CHAMFER2_SIZE2, e.wrapped, chamfer2_side_10[0].wrapped)  # the first distance lies on this face
    for e in chamfer2_edges_11:
        chamfer2.Add(CHAMFER2_SIZE, CHAMFER2_SIZE2, e.wrapped, chamfer2_side_11[0].wrapped)  # the first distance lies on this face
    add(Compound.cast(chamfer2.Shape()), mode=Mode.REPLACE)

    # Sketch9 → Cut-Extrude4 (cut, two sides: drawn at the far end of the back side and taken through both)
    with BuildSketch(Plane(origin=(0, 0, 0), x_dir=(0, 0, -1), z_dir=(1, 0, 0)).offset(-CUT_EXTRUDE4_DEPTH_BACK)):
        Circle(SKETCH9_R)
        with Locations((18, 0)):
            Circle(SKETCH9_R)
    extrude(amount=CUT_EXTRUDE4_DEPTH + CUT_EXTRUDE4_DEPTH_BACK, mode=Mode.SUBTRACT)


solid = part.part
